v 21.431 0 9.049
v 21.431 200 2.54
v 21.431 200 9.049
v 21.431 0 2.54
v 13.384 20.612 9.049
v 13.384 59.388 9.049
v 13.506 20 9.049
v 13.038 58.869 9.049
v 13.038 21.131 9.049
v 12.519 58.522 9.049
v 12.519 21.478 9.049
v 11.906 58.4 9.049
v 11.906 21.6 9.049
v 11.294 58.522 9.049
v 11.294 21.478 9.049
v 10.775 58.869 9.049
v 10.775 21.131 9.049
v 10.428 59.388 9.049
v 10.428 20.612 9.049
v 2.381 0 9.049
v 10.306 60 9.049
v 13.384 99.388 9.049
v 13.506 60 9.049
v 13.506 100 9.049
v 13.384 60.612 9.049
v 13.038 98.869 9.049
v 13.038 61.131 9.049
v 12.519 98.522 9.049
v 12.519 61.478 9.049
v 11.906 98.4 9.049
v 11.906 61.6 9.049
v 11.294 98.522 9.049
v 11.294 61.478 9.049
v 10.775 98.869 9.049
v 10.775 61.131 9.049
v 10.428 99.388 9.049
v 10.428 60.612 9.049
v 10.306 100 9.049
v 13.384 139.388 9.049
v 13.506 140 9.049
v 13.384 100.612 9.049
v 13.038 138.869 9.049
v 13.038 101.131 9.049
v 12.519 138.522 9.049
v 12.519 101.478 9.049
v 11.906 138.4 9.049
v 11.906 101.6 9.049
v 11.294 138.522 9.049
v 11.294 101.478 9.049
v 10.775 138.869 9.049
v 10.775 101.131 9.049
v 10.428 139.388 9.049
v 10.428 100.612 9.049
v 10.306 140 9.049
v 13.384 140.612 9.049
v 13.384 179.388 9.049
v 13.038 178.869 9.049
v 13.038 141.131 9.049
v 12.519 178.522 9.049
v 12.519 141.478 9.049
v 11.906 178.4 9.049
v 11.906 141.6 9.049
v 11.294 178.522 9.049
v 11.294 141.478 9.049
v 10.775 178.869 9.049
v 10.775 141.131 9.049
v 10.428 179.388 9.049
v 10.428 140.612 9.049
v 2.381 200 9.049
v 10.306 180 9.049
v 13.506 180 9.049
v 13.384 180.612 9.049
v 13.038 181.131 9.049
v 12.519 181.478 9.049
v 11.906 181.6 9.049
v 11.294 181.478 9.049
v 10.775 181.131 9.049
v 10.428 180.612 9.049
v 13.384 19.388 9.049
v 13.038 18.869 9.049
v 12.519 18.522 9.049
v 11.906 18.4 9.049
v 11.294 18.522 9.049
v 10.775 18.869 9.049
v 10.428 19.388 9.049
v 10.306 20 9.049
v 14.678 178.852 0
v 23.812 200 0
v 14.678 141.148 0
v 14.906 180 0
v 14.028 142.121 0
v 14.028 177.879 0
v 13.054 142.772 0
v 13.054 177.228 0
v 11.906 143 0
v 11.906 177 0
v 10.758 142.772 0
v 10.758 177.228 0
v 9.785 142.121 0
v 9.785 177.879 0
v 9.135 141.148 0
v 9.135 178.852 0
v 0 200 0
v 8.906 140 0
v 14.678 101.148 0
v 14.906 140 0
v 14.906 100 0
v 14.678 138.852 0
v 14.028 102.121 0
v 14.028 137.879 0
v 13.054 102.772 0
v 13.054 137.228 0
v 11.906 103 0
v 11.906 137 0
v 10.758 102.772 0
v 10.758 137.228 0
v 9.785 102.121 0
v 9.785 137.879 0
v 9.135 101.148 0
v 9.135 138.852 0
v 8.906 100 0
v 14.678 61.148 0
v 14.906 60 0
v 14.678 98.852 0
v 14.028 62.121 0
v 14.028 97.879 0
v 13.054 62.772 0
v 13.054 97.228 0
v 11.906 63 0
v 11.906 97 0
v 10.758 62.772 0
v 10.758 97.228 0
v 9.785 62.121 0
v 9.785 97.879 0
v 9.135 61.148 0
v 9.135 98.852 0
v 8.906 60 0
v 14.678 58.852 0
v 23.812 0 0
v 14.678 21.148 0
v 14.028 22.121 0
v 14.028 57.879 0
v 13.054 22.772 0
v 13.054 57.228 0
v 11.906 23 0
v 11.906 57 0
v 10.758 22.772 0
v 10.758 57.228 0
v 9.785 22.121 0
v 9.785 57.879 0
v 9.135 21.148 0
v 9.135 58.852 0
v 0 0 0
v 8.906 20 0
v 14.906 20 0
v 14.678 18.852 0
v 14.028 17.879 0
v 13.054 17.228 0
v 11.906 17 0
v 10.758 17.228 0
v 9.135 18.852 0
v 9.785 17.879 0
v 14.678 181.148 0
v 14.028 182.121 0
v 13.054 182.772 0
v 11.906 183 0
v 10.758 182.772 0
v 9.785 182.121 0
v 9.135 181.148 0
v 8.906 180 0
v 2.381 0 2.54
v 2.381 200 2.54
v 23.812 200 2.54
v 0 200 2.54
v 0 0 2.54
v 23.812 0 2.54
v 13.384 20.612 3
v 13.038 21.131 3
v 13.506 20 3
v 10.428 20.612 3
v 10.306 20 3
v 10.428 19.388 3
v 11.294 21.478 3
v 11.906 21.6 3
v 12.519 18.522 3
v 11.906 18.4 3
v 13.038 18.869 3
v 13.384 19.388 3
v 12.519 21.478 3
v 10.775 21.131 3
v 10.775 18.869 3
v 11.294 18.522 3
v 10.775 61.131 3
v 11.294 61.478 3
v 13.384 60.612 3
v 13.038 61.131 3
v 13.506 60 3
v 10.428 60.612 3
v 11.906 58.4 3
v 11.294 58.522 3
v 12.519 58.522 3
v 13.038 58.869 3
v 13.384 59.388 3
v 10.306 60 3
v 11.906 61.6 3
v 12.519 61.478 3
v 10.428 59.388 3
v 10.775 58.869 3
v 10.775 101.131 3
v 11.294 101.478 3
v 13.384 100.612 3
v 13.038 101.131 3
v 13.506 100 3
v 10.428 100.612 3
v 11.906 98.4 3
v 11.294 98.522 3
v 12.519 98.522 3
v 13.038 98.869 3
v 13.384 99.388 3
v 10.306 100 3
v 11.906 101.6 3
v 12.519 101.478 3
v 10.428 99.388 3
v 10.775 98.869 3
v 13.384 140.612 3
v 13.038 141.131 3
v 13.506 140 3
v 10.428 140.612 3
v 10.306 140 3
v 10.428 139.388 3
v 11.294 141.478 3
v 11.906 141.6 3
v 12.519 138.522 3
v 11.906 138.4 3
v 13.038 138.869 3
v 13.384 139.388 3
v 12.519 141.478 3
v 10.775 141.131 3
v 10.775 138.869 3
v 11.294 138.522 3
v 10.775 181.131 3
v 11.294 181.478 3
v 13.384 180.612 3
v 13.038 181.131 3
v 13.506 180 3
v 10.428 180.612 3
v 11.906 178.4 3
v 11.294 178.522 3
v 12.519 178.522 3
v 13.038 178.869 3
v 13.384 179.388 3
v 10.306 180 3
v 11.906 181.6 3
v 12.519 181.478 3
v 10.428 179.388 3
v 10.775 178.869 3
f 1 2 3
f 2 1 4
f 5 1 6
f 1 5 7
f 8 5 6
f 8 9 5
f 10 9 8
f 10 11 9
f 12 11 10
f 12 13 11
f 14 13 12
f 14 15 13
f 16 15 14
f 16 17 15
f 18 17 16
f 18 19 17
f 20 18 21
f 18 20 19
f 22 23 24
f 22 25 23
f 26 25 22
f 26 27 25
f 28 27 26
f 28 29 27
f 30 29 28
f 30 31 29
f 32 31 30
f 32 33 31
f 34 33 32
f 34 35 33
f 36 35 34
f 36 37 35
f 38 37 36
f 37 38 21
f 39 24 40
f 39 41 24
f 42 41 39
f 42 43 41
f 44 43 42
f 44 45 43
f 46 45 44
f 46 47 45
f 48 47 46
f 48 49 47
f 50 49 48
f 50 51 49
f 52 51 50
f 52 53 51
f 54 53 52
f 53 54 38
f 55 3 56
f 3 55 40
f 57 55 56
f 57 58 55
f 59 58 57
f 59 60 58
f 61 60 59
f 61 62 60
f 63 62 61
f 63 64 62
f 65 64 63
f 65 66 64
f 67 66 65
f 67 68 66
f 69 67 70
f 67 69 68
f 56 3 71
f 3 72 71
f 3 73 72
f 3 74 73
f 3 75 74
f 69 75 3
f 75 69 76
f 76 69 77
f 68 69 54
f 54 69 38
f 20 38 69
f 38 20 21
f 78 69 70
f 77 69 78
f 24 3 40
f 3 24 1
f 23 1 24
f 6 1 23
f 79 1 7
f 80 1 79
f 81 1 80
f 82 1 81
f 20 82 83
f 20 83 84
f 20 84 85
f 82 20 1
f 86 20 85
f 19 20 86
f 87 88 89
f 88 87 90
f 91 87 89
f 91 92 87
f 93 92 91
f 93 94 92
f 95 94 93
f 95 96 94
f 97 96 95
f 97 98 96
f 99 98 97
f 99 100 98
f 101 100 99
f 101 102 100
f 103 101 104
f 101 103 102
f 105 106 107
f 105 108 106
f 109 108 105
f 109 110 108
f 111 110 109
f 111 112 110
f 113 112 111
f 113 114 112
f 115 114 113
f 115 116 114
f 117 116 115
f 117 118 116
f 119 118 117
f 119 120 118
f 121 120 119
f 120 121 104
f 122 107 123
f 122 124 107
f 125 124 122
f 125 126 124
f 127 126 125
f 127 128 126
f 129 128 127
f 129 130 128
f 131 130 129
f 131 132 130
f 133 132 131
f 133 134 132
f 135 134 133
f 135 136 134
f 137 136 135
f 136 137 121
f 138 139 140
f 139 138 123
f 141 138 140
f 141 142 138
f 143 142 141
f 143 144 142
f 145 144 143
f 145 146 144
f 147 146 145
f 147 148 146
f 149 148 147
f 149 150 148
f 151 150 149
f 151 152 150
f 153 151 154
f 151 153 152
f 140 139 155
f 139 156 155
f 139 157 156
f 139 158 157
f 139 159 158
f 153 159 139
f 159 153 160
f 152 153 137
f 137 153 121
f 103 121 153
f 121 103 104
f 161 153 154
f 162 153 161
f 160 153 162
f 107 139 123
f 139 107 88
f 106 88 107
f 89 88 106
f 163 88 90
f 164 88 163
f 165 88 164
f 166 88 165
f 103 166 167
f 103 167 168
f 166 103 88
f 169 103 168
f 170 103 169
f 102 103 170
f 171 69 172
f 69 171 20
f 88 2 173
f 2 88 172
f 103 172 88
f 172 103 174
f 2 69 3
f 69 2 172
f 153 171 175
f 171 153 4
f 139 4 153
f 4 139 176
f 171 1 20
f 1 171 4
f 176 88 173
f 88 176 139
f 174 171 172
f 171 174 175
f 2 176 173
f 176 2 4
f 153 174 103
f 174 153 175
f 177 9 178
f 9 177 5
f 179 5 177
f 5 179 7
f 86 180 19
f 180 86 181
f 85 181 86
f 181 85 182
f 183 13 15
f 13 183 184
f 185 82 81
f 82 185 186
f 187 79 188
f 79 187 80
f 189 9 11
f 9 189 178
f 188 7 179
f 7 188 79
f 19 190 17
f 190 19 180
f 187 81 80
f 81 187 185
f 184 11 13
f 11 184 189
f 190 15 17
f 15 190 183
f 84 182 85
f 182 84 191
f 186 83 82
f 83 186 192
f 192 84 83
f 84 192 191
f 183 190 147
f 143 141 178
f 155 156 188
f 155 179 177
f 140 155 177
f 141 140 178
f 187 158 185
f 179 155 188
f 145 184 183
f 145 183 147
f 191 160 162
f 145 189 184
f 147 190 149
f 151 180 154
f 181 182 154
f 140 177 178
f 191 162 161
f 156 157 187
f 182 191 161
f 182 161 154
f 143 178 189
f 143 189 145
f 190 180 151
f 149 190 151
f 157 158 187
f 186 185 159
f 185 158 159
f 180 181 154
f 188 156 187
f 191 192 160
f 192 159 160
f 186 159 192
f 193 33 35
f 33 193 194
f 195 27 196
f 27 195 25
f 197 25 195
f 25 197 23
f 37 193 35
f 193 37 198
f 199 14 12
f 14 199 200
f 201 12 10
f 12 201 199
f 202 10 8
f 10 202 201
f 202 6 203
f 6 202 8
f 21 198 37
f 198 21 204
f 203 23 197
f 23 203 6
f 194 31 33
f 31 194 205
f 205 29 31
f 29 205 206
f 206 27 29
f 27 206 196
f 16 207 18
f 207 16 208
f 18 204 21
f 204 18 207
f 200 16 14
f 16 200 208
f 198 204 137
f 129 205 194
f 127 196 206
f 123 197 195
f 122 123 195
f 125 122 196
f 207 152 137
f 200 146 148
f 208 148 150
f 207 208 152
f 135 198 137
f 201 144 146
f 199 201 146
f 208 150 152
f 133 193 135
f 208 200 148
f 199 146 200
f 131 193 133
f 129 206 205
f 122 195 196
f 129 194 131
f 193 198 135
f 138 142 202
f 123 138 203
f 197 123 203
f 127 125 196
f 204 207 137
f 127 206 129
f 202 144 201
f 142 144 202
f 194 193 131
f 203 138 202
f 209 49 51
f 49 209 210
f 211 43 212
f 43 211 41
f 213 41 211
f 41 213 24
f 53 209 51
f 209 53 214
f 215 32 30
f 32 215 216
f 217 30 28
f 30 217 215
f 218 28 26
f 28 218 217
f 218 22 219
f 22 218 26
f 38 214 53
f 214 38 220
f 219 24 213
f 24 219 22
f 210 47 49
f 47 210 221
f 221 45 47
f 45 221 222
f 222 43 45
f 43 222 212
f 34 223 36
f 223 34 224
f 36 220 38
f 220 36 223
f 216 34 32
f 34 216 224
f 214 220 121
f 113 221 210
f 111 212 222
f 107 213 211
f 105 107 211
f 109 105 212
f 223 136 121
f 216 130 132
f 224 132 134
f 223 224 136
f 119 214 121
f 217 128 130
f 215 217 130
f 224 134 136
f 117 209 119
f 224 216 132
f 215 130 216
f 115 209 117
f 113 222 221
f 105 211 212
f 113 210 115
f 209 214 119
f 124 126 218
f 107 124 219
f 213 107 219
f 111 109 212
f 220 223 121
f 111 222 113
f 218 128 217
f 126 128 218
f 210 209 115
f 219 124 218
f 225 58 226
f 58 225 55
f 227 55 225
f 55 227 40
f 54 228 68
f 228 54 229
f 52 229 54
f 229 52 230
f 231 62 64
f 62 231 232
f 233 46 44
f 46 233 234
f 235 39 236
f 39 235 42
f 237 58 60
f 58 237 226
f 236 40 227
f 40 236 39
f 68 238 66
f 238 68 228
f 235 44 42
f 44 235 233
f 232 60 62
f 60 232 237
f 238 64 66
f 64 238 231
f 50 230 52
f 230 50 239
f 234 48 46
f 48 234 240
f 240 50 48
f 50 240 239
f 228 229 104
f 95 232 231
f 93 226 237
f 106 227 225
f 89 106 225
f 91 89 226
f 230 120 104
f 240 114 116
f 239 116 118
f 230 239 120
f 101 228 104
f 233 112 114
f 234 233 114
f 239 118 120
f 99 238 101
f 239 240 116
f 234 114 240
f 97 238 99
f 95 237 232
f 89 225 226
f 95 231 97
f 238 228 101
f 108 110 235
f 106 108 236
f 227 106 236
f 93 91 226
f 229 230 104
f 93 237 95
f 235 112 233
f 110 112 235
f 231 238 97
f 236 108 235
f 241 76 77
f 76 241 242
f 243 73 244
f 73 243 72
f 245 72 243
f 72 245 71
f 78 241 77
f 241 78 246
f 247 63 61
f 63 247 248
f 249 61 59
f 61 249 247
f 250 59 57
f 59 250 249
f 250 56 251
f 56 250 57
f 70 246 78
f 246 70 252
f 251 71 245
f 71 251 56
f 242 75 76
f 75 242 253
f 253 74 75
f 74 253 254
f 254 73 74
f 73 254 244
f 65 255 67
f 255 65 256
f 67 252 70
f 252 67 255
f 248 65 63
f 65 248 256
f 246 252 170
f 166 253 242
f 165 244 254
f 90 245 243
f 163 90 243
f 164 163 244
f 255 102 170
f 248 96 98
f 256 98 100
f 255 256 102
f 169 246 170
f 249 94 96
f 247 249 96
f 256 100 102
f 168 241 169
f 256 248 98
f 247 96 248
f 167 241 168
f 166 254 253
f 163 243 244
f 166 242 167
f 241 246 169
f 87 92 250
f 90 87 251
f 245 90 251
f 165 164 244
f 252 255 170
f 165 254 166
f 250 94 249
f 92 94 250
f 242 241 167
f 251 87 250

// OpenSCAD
$fn = 16;
inch = 25.4;

height_adjustment = 0.95;

bar_length = 200;
bar_width_1 = inch * 3/4;
bar_width_2 = inch * 15/16;
bar_height_1 = inch * 3/8 * height_adjustment;
bar_height_2 = inch * 1/10;

desired_hole_offset = 20;
hole_spacing = 40;
hole_dia = 3.2;
screw_head_dia = 6;
screw_head_height = 3;

number_of_holes = round((bar_length - desired_hole_offset) / hole_spacing);
hole_offset = (bar_length - ((number_of_holes - 1) * hole_spacing)) / 2;

echo(str("<strong>Höhe gesamt      : ", bar_height_1, "</strong>"));
echo(str("<strong>Anzahl Bohrungen : ", number_of_holes, "</strong>"));
echo(str("<strong>Versatz Bohrungen: ", hole_offset, "</strong>"));

difference() {
    union() {
        translate([(bar_width_2 - bar_width_1) / 2, 0, 0])
            cube([bar_width_1, bar_length, bar_height_1]);
        cube([bar_width_2, bar_length, bar_height_2]);
    }
    
    translate([bar_width_2 / 2, hole_offset, 0]) {
        for(i = [0:number_of_holes - 1]) {
            translate([0, i * hole_spacing, 0]) {
                cylinder(d = hole_dia, h = bar_height_1);
                cylinder(d1 = screw_head_dia, d2 = hole_dia, h = screw_head_height);
            }
        }
    }
}
